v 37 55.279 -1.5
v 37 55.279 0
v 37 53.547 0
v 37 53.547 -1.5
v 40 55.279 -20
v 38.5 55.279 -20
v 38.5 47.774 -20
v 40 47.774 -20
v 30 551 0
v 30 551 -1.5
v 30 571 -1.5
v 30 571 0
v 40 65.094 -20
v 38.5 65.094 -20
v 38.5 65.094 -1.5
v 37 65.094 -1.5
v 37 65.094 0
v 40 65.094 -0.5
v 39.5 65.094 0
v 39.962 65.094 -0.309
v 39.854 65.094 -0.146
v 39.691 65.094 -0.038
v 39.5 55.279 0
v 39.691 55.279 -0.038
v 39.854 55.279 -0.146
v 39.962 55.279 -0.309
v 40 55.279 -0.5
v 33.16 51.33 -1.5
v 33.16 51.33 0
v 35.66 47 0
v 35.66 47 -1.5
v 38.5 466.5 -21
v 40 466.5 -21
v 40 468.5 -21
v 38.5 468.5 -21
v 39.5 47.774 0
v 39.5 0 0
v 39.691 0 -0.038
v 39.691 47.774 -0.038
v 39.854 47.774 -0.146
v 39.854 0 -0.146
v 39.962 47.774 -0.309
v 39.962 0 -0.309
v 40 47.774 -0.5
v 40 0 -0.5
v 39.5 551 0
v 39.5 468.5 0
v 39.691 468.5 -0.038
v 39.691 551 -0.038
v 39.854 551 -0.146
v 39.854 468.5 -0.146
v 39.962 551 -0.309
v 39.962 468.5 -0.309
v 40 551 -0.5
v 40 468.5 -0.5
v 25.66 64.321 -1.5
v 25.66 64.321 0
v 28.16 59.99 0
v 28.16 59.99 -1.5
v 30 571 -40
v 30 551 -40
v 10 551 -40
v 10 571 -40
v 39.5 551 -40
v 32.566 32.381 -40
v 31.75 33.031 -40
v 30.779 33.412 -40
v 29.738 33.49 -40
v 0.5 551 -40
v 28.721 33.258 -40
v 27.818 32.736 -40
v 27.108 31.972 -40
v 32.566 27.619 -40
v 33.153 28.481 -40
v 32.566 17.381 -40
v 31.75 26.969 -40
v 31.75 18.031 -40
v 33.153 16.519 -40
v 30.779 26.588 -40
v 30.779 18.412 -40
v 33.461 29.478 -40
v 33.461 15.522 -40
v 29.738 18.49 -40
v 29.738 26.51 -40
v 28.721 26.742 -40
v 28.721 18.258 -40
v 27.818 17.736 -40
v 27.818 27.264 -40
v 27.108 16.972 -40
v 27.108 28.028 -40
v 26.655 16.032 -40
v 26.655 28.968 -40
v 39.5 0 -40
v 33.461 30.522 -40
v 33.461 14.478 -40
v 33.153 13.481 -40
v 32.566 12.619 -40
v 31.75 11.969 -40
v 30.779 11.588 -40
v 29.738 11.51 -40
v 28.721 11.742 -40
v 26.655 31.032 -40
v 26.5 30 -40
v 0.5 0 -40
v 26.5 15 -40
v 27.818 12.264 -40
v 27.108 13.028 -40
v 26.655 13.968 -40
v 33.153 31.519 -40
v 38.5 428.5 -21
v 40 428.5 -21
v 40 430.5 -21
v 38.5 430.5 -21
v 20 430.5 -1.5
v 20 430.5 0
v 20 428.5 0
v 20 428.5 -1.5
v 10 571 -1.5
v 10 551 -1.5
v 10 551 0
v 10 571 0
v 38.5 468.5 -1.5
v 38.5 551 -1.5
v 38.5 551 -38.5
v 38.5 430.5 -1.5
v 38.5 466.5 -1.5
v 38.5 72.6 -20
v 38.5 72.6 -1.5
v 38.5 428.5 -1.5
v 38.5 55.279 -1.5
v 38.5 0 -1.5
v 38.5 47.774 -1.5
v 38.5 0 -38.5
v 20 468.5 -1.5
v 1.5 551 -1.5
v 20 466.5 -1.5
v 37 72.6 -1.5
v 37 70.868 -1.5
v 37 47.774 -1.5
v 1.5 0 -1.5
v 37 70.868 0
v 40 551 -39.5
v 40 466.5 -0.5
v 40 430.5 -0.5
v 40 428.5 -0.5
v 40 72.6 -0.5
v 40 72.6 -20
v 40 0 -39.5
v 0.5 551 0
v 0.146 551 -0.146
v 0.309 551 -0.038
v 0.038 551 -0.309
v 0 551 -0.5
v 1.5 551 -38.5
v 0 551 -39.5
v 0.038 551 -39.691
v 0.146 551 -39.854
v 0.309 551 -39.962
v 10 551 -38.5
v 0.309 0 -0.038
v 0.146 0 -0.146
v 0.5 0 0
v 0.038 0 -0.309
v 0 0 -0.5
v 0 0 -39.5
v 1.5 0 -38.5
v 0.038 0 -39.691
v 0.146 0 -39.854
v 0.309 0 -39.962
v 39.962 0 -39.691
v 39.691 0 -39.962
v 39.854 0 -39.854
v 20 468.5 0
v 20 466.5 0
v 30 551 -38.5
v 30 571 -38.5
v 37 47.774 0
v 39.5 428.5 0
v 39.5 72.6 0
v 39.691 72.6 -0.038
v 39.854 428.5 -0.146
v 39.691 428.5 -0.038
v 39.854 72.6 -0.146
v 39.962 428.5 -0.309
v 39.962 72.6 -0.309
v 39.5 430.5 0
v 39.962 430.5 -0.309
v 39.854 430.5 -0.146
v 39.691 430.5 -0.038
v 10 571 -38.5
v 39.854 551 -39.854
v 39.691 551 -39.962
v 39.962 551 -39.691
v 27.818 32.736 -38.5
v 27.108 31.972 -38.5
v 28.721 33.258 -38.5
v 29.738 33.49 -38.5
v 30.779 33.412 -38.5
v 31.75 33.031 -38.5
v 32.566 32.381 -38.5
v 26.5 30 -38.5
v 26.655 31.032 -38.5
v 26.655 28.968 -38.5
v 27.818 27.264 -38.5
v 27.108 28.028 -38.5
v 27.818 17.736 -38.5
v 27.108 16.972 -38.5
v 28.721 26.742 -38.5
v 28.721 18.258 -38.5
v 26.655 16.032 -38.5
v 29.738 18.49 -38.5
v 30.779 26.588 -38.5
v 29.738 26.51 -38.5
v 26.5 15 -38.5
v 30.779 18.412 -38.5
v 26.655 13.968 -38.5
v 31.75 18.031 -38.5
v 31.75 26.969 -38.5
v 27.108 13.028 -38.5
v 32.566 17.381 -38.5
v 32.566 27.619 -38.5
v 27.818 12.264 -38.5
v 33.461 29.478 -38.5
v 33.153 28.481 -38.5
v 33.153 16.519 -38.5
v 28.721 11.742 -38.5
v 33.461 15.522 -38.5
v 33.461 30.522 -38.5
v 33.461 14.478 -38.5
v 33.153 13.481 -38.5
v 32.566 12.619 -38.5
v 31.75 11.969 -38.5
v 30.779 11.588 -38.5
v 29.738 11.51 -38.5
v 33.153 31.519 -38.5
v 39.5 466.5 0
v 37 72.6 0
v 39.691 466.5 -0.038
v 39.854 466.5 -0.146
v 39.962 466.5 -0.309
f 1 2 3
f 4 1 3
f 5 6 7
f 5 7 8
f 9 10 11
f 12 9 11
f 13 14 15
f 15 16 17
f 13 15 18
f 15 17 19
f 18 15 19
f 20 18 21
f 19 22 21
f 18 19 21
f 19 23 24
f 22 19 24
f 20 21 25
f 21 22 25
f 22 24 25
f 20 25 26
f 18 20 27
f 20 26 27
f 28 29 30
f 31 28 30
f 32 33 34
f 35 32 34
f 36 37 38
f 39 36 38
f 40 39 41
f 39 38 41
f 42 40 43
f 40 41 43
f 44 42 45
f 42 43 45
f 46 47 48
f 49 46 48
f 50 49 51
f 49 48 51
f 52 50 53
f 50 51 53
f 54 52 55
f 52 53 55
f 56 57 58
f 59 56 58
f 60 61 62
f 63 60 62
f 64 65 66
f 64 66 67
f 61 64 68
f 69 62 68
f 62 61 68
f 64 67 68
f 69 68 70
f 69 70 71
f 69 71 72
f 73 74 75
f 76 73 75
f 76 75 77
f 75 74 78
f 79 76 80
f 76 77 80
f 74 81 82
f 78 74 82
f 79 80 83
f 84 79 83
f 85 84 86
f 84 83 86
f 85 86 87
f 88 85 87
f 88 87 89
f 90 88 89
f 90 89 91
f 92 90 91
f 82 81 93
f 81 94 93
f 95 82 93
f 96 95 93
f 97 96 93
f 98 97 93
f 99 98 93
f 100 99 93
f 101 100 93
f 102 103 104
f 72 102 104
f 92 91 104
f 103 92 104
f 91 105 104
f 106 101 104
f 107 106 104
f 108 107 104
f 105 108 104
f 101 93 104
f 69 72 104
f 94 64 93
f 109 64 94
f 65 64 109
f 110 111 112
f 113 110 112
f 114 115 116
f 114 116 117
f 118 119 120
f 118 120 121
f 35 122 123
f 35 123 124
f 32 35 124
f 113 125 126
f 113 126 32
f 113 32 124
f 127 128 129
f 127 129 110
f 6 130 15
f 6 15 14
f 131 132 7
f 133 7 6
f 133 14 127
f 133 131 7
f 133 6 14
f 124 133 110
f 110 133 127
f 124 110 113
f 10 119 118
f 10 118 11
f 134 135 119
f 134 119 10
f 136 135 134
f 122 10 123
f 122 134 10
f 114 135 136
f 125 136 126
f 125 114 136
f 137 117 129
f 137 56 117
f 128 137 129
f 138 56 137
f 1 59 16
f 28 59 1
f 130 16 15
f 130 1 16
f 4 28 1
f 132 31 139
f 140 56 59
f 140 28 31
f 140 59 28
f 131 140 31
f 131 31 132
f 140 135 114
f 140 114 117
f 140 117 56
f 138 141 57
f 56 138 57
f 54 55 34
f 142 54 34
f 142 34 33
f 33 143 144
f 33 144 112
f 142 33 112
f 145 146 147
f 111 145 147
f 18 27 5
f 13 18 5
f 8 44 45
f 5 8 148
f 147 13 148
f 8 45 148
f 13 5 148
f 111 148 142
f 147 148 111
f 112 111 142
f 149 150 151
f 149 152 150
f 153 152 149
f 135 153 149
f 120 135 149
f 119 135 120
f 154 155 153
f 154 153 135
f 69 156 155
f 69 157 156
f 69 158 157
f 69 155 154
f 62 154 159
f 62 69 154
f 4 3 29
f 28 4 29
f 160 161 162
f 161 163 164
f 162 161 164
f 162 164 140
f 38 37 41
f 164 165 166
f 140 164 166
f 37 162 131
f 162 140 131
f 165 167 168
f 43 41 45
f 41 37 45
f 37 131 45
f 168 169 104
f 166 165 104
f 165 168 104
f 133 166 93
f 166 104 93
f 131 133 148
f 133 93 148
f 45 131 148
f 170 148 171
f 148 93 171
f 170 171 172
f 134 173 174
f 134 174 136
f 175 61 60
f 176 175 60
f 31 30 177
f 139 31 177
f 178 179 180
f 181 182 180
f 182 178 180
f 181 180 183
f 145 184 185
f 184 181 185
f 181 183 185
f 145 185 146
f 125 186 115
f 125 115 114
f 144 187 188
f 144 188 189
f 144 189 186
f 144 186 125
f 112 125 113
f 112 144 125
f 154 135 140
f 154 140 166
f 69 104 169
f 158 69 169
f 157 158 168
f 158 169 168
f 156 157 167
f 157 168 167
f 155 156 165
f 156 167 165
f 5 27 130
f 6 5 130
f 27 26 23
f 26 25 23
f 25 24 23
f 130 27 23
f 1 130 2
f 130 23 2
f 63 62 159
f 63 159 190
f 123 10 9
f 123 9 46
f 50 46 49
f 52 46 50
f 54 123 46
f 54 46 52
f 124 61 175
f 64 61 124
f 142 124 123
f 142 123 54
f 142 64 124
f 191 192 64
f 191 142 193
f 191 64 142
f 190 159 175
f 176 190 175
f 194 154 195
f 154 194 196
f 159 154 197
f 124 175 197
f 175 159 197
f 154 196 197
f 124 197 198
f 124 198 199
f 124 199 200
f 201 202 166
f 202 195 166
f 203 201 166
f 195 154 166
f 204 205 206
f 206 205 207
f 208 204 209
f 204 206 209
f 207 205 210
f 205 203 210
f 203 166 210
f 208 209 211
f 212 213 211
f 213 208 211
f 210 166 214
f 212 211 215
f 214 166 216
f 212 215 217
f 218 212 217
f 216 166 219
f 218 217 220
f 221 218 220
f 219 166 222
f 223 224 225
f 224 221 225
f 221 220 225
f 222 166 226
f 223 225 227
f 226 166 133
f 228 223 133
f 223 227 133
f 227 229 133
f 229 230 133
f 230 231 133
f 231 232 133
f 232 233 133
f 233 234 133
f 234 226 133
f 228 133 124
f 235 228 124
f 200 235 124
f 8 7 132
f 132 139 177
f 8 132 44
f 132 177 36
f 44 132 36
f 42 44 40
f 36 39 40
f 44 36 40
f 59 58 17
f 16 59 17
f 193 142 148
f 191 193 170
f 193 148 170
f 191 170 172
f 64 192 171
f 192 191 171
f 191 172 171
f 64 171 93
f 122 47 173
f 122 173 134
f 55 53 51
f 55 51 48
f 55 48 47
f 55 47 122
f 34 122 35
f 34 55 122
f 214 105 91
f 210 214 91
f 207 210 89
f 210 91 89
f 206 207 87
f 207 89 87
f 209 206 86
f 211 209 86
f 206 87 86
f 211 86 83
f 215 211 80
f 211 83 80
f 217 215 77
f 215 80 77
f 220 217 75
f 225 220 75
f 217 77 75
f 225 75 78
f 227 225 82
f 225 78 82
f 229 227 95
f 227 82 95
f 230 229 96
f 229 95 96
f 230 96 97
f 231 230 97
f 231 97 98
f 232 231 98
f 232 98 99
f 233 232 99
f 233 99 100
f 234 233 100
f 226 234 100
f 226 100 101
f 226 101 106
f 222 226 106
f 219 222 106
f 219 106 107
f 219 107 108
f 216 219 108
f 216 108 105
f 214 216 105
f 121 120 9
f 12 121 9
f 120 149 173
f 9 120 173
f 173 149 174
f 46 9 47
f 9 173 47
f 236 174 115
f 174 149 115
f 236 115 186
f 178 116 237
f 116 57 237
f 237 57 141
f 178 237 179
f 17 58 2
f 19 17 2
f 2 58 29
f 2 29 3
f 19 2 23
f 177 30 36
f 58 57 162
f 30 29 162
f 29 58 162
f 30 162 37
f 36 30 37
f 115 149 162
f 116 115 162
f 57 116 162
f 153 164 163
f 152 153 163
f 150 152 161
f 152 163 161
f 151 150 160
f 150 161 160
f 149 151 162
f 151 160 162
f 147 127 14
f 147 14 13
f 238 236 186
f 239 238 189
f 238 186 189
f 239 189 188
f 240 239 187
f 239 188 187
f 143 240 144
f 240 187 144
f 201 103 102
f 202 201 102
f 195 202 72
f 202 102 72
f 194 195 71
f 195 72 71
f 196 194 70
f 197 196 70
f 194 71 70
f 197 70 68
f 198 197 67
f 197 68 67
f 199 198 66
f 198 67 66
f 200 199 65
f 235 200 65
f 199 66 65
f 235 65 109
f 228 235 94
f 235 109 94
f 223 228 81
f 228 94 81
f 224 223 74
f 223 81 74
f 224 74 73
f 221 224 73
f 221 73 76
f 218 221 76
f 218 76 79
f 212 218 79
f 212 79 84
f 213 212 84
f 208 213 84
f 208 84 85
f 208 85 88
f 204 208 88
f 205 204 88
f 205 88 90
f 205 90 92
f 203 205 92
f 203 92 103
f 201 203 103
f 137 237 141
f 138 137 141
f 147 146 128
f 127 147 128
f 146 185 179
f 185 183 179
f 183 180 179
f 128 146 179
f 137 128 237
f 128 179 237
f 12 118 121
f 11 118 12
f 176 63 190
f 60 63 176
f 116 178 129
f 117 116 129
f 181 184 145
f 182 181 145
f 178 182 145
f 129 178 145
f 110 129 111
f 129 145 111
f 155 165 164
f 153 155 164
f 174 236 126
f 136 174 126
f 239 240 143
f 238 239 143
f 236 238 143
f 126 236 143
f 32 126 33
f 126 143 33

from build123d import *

# Parameters (mm, degrees)
SKETCH1_W           = 37
SKETCH1_H           = 37
BOSS_EXTRUDE1_DEPTH = 571
SKETCH2_W           = 10
SKETCH2_H           = 20
CUT_EXTRUDE1_DEPTH  = 40
SKETCH3_W           = 21
SKETCH3_H           = 2
CUT_EXTRUDE2_DEPTH  = 20
CUT_EXTRUDE3_START  = -40
CUT_EXTRUDE3_DEPTH  = 20
SKETCH5_R           = 3.5
CUT_EXTRUDE4_DEPTH  = 10


with BuildPart() as part:
    # Sketch1 → Boss-Extrude1 (new body)
    with BuildSketch(Plane(origin=(0, 0, 0), x_dir=(1, 0, 0), z_dir=(0, 1, 0))):
        with BuildLine():
            Line((0.5, 0), (39.5, 0))
            ThreePointArc((39.5, 0), (39.853553391, 0.146446609), (40, 0.5))
            Line((40, 0.5), (40, 39.5))
            ThreePointArc((40, 39.5), (39.853553391, 39.853553391), (39.5, 40))
            Line((39.5, 40), (0.5, 40))
            ThreePointArc((0.5, 40), (0.146446609, 39.853553391), (0, 39.5))
            Line((0, 39.5), (0, 0.5))
            ThreePointArc((0, 0.5), (0.146446609, 0.146446609), (0.5, 0))
        make_face()
        with Locations((20, 20)):
            Rectangle(SKETCH1_W, SKETCH1_H, mode=Mode.SUBTRACT)
    extrude(amount=BOSS_EXTRUDE1_DEPTH)

    # Sketch2 → Cut-Extrude1 (cut)
    with BuildSketch(Plane.XY.offset(-40)):
        with Locations((35, 561)):
            Rectangle(SKETCH2_W, SKETCH2_H)
        with Locations((5, 561)):
            Rectangle(SKETCH2_W, SKETCH2_H)
    extrude(amount=CUT_EXTRUDE1_DEPTH, mode=Mode.SUBTRACT)

    # Sketch3 → Cut-Extrude2 (cut)
    with BuildSketch(Plane(origin=(40, 0, 0), x_dir=(0, 0, -1), z_dir=(1, 0, 0))):
        with Locations((10.5, 467.5)):
            Rectangle(SKETCH3_W, SKETCH3_H)
        with Locations((10.5, 429.5)):
            Rectangle(SKETCH3_W, SKETCH3_H)
    extrude(amount=-CUT_EXTRUDE2_DEPTH, mode=Mode.SUBTRACT)

    # Sketch4 → Cut-Extrude3 (cut)
    with BuildSketch(Plane(origin=(0, 0, -40), x_dir=(-1, 0, 0), z_dir=(0, 0, -1)).offset(CUT_EXTRUDE3_START)):
        Polygon((-40, 72.59987752), (-37, 72.59987752), (-37, 70.867826713), (-25.659711467, 64.320508076), (-28.159711467, 59.990381057), (-37, 65.094324021), (-40, 65.094324021), align=None)
        Polygon((-40, 55.279369445), (-37, 55.279369445), (-37, 53.547318637), (-33.159711467, 51.330127019), (-35.659711467, 47), (-37, 47.773815945), (-40, 47.773815945), align=None)
    extrude(amount=CUT_EXTRUDE3_DEPTH, mode=Mode.SUBTRACT)

    # Sketch5 → Cut-Extrude4 (cut)
    with BuildSketch(Plane(origin=(0, 0, -40), x_dir=(-1, 0, 0), z_dir=(0, 0, -1))):
        with Locations((-30, 15)):
            Circle(SKETCH5_R)
        with Locations((-30, 30)):
            Circle(SKETCH5_R)
    extrude(amount=-CUT_EXTRUDE4_DEPTH, mode=Mode.SUBTRACT)


solid = part.part
